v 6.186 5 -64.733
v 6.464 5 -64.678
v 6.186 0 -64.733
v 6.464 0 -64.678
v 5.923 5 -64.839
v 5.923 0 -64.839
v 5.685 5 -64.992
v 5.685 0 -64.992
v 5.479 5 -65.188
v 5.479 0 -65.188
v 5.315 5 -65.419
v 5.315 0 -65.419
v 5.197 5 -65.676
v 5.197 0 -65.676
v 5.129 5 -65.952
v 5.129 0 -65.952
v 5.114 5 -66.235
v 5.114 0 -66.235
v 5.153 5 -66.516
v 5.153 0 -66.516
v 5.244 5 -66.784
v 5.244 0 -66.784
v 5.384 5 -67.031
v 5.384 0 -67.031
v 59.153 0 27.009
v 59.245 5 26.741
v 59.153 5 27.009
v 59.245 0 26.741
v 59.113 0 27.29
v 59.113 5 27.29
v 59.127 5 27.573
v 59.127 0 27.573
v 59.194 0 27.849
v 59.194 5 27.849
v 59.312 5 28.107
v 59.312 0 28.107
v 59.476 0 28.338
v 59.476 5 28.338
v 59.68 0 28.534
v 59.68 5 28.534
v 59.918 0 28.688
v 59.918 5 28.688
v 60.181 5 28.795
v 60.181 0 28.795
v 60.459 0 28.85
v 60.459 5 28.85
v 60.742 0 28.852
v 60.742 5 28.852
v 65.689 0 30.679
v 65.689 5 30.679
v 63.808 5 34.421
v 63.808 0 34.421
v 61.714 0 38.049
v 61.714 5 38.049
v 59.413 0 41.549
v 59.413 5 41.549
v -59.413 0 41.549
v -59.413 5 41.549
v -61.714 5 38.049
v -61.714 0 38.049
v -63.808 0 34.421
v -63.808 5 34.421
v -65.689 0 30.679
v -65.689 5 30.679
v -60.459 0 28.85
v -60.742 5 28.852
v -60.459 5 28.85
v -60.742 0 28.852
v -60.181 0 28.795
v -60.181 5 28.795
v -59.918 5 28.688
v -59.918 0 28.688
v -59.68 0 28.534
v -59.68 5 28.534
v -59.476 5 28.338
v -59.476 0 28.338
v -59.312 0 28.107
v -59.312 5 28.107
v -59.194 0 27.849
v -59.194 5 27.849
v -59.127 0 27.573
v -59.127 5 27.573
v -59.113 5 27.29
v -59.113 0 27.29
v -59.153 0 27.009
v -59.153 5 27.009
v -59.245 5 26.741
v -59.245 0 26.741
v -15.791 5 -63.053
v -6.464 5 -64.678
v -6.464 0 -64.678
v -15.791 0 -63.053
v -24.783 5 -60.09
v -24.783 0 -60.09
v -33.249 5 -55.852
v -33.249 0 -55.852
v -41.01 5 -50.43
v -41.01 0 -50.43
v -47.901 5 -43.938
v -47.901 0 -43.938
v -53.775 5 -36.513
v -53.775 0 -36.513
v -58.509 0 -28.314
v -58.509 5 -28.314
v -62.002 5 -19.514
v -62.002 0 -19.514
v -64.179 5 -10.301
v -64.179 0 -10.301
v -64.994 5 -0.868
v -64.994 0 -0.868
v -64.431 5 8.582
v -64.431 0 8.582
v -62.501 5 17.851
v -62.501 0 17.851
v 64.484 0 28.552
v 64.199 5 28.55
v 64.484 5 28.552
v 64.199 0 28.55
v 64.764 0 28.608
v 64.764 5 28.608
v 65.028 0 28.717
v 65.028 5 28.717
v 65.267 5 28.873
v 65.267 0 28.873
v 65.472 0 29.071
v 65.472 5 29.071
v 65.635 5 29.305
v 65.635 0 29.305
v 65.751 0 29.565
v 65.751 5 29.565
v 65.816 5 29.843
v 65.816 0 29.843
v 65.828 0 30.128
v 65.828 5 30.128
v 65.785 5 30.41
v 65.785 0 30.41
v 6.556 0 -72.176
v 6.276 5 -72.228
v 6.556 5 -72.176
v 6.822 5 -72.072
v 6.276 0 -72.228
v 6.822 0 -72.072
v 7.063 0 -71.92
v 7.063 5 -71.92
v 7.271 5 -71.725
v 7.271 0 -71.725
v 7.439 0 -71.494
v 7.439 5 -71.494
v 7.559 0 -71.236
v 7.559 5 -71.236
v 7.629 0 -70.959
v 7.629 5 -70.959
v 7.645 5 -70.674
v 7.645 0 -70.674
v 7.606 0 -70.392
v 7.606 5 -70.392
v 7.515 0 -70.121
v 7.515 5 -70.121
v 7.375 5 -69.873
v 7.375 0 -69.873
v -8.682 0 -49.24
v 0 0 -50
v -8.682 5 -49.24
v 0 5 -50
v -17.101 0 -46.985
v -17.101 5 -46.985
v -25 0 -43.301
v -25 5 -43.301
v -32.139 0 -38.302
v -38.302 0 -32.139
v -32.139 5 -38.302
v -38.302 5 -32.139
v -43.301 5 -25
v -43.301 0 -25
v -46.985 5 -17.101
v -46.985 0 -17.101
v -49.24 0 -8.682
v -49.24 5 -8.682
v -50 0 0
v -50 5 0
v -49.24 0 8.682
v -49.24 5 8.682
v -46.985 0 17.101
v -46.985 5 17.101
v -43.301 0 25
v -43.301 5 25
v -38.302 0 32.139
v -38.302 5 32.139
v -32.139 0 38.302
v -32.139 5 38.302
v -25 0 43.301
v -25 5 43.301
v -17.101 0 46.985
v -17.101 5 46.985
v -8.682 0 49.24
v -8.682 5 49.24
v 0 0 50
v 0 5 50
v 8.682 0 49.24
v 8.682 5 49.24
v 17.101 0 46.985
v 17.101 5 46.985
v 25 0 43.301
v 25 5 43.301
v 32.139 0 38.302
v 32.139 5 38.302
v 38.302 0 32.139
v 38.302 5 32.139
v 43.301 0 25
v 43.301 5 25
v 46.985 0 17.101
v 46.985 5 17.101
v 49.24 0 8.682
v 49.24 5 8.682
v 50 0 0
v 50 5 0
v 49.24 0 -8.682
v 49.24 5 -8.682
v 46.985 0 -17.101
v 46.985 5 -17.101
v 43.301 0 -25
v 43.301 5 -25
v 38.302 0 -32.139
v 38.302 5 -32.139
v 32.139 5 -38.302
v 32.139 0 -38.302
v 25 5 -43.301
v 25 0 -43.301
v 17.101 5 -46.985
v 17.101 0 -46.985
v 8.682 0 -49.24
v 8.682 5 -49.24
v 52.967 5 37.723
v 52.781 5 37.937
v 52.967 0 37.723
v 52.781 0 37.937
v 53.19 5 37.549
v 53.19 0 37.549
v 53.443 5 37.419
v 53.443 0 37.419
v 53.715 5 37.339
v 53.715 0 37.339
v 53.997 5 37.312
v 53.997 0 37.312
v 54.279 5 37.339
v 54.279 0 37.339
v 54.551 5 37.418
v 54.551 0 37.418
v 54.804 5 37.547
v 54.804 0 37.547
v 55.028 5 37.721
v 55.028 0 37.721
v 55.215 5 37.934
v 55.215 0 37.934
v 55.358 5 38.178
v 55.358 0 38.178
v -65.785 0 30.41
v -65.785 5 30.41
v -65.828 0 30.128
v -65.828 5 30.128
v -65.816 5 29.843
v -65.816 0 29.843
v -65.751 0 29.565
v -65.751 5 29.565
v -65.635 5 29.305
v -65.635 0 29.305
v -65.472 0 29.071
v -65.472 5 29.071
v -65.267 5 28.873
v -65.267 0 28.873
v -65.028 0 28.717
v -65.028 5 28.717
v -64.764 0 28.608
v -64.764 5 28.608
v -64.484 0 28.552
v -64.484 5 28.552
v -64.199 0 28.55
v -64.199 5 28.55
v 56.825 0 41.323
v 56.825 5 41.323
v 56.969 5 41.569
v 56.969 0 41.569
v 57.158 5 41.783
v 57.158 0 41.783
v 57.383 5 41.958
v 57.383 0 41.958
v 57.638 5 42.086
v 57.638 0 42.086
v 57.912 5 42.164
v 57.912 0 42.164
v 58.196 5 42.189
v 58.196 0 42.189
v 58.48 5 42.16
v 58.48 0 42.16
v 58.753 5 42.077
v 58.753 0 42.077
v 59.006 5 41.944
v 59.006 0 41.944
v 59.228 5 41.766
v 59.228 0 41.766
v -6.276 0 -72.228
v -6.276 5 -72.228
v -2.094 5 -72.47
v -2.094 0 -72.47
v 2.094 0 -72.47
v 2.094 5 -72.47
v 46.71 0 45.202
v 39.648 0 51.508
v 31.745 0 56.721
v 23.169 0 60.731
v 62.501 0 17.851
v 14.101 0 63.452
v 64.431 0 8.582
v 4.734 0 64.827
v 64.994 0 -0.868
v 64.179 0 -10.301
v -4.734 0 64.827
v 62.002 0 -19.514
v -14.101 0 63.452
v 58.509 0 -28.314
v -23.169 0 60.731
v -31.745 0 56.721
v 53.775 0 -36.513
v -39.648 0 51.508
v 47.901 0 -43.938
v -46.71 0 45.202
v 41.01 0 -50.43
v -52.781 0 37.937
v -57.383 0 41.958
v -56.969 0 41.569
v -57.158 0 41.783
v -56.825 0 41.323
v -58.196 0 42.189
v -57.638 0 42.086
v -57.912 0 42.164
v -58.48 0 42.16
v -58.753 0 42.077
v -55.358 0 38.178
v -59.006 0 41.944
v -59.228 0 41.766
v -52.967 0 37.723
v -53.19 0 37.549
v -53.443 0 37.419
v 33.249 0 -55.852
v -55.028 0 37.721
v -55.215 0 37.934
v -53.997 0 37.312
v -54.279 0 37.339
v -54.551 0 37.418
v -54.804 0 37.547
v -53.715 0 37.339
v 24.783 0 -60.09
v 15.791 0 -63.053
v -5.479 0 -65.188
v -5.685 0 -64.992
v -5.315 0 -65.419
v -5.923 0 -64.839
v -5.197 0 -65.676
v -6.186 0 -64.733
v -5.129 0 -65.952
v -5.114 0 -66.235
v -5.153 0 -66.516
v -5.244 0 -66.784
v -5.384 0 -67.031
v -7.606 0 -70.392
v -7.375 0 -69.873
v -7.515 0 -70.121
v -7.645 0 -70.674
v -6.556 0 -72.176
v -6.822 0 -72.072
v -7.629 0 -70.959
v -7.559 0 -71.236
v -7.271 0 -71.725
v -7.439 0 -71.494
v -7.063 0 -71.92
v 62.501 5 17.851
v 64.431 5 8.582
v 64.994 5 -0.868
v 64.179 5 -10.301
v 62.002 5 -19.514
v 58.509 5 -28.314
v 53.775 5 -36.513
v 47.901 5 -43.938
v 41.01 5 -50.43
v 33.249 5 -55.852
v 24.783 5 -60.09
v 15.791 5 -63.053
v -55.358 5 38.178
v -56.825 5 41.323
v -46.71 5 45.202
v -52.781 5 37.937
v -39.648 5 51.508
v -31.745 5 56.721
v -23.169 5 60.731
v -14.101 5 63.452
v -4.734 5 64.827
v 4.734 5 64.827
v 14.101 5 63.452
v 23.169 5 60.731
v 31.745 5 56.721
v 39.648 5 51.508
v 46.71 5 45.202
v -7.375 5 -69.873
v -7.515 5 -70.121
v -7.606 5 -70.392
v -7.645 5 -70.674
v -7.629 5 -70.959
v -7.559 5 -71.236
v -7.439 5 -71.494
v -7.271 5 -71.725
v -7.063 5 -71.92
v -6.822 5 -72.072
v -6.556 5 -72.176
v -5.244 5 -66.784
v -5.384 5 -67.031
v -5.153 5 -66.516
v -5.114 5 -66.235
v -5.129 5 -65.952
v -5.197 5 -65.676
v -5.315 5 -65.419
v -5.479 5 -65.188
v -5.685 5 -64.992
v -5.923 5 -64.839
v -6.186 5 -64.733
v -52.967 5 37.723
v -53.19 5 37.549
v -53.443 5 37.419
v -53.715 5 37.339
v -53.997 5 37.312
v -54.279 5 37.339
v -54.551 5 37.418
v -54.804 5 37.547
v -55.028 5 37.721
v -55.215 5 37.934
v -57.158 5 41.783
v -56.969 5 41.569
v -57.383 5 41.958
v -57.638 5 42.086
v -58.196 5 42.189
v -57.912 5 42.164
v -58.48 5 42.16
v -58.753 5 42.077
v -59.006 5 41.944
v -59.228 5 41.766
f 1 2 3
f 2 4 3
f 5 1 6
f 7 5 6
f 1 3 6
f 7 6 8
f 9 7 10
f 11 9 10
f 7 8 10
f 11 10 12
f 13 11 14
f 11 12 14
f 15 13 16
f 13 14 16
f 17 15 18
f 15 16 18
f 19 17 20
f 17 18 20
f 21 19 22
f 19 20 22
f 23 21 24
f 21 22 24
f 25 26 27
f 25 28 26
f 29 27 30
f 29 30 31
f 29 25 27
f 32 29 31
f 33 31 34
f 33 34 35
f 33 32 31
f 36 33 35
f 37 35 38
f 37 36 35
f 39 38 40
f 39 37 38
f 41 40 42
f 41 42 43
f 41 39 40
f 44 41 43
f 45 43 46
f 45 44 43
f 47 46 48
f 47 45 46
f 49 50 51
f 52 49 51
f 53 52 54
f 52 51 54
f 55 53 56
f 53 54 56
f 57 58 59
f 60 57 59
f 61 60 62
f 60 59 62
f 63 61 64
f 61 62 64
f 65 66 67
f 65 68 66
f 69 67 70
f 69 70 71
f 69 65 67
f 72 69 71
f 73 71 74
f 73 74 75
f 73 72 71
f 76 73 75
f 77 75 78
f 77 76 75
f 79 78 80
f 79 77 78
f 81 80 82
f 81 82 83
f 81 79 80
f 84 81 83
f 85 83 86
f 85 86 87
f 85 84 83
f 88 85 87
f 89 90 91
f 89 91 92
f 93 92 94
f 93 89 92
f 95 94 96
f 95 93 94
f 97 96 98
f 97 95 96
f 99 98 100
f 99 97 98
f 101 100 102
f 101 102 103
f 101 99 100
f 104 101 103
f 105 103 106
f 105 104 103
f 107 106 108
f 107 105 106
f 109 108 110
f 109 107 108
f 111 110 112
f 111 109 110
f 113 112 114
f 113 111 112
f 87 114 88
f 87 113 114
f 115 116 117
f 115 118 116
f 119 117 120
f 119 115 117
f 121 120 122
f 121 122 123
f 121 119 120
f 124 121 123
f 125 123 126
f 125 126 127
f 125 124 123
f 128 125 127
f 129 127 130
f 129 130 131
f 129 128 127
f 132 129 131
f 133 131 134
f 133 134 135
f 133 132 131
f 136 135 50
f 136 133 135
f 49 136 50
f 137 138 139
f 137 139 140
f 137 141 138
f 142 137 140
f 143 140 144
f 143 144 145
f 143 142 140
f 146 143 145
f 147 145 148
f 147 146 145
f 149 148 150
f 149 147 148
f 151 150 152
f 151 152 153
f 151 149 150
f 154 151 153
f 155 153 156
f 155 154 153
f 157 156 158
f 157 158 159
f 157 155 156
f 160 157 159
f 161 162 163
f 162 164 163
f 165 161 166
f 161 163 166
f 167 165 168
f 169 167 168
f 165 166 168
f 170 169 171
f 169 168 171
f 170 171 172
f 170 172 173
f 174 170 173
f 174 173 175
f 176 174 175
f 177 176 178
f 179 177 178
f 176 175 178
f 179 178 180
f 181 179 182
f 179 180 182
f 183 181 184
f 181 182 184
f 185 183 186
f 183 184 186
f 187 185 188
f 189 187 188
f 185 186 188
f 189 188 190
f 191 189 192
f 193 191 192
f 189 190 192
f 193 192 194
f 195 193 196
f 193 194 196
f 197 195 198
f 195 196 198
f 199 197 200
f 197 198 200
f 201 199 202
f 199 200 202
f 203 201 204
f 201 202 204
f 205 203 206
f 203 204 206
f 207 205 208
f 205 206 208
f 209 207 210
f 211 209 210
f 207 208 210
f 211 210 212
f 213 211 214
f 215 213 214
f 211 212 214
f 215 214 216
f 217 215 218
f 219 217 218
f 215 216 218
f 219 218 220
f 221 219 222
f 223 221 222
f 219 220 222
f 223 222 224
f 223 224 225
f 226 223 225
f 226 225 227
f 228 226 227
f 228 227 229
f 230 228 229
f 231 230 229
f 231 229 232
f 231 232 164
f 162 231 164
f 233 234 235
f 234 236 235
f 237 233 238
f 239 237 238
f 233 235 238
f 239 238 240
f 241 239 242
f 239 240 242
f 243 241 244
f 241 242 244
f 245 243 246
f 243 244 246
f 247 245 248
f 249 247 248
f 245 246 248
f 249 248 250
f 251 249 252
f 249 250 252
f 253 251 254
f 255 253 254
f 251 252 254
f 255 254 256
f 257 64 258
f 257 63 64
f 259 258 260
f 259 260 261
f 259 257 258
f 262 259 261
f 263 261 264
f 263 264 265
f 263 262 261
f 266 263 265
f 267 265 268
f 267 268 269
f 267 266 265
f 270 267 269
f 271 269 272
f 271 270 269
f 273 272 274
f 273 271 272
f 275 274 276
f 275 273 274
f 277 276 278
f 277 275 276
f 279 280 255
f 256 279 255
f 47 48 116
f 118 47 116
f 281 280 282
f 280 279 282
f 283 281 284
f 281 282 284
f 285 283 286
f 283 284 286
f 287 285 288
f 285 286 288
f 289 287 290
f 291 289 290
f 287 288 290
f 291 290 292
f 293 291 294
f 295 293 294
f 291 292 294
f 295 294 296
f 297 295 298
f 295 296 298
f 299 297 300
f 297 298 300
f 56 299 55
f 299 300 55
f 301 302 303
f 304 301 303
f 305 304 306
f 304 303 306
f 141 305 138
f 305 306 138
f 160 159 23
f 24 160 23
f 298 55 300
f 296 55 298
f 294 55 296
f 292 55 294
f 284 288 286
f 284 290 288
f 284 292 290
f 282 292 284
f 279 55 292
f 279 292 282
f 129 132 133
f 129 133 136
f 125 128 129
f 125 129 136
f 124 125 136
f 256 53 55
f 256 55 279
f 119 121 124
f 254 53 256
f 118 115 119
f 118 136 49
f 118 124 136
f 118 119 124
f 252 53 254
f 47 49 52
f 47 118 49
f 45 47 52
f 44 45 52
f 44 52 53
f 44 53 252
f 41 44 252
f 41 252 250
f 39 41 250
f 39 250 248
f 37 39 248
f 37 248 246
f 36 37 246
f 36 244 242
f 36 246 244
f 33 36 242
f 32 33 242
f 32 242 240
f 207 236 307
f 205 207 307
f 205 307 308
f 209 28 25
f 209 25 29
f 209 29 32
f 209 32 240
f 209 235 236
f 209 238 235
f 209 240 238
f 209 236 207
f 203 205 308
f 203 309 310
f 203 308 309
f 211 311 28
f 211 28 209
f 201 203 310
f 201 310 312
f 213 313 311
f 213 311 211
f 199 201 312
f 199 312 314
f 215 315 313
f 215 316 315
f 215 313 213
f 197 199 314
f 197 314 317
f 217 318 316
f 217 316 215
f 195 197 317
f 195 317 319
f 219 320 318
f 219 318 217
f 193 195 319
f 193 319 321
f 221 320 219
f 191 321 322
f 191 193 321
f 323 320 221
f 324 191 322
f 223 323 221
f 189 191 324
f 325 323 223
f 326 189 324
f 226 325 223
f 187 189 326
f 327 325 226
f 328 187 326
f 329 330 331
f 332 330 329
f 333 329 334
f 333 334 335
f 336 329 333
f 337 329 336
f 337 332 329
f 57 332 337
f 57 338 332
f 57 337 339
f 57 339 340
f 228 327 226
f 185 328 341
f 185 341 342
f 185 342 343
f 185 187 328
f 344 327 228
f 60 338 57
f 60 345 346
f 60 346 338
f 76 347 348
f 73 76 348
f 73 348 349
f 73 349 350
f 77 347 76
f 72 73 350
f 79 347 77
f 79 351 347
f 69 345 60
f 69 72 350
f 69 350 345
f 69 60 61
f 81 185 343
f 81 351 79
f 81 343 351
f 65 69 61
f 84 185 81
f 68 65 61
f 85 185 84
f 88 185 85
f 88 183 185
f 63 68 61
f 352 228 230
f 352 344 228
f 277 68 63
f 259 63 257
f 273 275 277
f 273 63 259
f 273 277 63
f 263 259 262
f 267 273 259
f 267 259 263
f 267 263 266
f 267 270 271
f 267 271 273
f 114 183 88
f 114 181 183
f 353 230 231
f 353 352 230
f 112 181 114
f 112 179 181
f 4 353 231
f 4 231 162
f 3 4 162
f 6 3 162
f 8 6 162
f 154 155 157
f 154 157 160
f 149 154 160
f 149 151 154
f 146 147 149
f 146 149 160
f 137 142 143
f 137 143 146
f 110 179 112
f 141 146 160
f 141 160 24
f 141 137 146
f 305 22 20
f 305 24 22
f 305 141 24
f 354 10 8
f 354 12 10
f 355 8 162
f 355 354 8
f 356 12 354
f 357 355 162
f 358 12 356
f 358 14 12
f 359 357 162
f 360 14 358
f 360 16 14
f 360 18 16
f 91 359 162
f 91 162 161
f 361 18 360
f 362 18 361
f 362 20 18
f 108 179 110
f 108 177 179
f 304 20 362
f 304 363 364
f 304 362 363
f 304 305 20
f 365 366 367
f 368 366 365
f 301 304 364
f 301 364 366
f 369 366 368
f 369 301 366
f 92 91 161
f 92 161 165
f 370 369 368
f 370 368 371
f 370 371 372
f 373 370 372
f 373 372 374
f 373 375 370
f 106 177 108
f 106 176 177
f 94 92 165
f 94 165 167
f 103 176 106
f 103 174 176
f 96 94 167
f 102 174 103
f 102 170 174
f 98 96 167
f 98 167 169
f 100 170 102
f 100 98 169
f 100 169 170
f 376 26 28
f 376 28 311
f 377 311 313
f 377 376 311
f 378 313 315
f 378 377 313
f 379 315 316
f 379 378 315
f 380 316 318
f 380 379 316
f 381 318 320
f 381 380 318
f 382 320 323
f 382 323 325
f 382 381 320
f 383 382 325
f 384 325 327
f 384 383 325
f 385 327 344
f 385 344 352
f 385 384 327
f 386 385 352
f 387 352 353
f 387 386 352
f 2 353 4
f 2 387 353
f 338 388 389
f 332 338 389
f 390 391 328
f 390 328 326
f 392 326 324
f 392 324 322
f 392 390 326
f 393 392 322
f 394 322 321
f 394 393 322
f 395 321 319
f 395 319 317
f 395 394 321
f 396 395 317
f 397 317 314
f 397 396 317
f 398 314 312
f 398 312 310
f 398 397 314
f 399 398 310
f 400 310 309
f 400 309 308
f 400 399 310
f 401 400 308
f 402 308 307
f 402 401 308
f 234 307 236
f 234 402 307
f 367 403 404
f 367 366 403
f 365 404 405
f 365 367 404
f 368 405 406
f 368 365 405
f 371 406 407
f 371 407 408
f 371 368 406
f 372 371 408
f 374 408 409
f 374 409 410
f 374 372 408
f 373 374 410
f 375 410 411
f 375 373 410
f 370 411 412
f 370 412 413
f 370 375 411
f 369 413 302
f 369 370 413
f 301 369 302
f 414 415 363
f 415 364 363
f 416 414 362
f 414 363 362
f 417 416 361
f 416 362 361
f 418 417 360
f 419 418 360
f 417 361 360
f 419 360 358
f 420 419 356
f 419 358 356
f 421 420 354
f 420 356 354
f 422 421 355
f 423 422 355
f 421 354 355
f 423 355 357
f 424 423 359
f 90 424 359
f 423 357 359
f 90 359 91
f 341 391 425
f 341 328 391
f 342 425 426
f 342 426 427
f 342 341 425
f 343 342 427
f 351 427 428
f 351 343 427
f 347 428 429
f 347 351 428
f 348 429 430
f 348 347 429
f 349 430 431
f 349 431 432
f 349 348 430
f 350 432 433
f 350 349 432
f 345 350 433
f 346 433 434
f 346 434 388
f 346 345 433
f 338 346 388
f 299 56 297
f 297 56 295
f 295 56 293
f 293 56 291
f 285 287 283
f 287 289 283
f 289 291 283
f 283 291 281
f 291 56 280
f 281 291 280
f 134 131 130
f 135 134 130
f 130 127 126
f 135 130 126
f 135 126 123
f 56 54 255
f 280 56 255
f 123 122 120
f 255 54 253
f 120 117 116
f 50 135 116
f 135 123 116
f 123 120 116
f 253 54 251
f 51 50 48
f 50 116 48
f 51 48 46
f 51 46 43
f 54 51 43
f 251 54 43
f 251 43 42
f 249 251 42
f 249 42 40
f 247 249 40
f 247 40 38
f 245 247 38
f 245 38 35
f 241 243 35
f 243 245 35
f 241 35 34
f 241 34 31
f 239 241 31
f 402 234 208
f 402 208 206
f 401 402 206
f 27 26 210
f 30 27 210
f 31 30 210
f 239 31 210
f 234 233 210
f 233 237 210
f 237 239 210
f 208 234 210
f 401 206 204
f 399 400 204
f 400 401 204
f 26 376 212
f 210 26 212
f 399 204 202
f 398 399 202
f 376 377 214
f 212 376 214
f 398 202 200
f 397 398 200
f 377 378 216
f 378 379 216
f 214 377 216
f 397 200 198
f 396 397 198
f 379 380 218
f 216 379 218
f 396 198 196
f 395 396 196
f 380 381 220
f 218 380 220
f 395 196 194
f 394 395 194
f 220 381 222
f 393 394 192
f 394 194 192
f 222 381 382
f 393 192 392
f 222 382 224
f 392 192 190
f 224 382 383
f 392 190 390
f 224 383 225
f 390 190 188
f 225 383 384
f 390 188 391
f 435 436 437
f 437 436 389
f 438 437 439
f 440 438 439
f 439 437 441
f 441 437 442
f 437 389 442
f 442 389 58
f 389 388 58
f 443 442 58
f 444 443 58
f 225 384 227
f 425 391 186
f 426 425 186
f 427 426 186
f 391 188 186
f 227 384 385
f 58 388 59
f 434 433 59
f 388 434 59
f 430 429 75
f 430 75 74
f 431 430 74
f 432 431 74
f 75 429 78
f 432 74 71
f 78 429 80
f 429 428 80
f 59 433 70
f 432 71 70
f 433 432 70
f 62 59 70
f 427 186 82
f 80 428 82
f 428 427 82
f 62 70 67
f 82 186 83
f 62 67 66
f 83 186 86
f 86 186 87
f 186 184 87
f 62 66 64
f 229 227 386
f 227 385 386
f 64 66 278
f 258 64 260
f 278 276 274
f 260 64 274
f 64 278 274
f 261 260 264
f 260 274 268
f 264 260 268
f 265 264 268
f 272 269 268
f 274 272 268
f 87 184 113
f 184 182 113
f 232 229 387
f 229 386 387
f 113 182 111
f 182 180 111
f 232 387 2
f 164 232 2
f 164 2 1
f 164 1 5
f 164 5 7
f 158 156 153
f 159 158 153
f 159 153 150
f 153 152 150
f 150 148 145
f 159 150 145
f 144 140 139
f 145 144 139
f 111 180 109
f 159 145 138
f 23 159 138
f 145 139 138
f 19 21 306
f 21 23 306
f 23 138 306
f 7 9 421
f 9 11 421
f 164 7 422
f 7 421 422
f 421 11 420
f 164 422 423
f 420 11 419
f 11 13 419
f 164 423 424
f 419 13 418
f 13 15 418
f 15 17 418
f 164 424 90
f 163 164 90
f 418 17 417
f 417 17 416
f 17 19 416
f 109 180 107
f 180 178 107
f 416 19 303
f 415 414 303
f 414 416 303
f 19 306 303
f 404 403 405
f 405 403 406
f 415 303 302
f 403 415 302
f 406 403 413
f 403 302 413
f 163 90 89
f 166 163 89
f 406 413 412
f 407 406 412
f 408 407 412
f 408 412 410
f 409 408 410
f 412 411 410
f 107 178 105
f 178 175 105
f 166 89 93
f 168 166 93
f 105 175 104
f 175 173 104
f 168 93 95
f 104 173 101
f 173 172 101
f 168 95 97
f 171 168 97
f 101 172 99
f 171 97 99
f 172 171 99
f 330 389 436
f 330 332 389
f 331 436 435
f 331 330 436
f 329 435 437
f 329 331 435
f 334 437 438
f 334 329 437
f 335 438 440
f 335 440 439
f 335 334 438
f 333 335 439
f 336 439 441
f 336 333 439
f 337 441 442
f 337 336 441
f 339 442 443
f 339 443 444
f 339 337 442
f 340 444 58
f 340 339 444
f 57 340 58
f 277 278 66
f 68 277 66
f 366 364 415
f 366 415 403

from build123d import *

# Parameters (mm, degrees)
SKETCH2_W                = 15
SKETCH2_H                = 5
BOSS_EXTRUDE1_DEPTH      = 5
FILLET2_R                = 1.5
CIRPATTERN4_COUNT        = 3
FILLET2_OF_CIRPATTERN4_R = 1.5


with BuildPart() as part:
    # Sketch2 → Revolve1 (revolve)
    with BuildSketch(Plane(origin=(0, 0, 0), x_dir=(0, 0, -1), z_dir=(1, 0, 0)), mode=Mode.PRIVATE) as revolve1_sk:
        with Locations((-57.5, 2.5)):
            Rectangle(SKETCH2_W, SKETCH2_H)
    revolve(revolve1_sk.sketch.rotate(Axis((0, -0.75, 0), (0, 1, 0)), 180), axis=Axis((0, -0.75, 0), (0, 1, 0)))

    # Sketch4 → Boss-Extrude1 (add)
    with BuildSketch(Plane(origin=(0, 5, 0), x_dir=(1, 0, 0), z_dir=(0, 1, 0))):
        with BuildLine():
            Line((-3.881158746, 64.88402428), (-8.835527397, 71.959595994))
            ThreePointArc((-8.835527397, 71.959595994), (0, 72.5), (8.835527397, 71.959595994))
            Line((8.835527397, 71.959595994), (3.881158746, 64.88402428))
            ThreePointArc((3.881158746, 64.88402428), (0, 65), (-3.881158746, 64.88402428))
        make_face()
    boss_extrude1 = extrude(amount=-BOSS_EXTRUDE1_DEPTH)

    # Fillet2
    fillet2_edges = [part.edges().sort_by_distance(p)[0] for p in [
        (3.881158746, 2.5, -64.88402428),
        (-3.881158746, 2.5, -64.88402428),
        (-8.835527397, 2.5, -71.959595994),
        (8.835527397, 2.5, -71.959595994),
    ]]
    fillet(fillet2_edges, radius=FILLET2_R)

    # CirPattern4: Boss-Extrude1 ×3 about axis
    cirpattern4_axis = Axis((0, 0, 0), (0, 1, 0))
    for i in range(1, CIRPATTERN4_COUNT):
        add(boss_extrude1.rotate(cirpattern4_axis, i * 360 / CIRPATTERN4_COUNT))

    # Fillet2 of CirPattern4
    fillet2_of_cirpattern4_edges = [part.edges().sort_by_distance(p)[0] for p in [
        (-58.131792699, 2.5, 29.08083007),
        (-54.250633954, 2.5, 35.80319421),
        (-57.901074478, 2.5, 43.631589179),
        (-66.736601875, 2.5, 28.328006815),
        (54.250633954, 2.5, 35.80319421),
        (58.131792699, 2.5, 29.08083007),
        (66.736601875, 2.5, 28.328006815),
        (57.901074478, 2.5, 43.631589179),
    ]]
    fillet(fillet2_of_cirpattern4_edges, radius=FILLET2_OF_CIRPATTERN4_R)


solid = part.part
